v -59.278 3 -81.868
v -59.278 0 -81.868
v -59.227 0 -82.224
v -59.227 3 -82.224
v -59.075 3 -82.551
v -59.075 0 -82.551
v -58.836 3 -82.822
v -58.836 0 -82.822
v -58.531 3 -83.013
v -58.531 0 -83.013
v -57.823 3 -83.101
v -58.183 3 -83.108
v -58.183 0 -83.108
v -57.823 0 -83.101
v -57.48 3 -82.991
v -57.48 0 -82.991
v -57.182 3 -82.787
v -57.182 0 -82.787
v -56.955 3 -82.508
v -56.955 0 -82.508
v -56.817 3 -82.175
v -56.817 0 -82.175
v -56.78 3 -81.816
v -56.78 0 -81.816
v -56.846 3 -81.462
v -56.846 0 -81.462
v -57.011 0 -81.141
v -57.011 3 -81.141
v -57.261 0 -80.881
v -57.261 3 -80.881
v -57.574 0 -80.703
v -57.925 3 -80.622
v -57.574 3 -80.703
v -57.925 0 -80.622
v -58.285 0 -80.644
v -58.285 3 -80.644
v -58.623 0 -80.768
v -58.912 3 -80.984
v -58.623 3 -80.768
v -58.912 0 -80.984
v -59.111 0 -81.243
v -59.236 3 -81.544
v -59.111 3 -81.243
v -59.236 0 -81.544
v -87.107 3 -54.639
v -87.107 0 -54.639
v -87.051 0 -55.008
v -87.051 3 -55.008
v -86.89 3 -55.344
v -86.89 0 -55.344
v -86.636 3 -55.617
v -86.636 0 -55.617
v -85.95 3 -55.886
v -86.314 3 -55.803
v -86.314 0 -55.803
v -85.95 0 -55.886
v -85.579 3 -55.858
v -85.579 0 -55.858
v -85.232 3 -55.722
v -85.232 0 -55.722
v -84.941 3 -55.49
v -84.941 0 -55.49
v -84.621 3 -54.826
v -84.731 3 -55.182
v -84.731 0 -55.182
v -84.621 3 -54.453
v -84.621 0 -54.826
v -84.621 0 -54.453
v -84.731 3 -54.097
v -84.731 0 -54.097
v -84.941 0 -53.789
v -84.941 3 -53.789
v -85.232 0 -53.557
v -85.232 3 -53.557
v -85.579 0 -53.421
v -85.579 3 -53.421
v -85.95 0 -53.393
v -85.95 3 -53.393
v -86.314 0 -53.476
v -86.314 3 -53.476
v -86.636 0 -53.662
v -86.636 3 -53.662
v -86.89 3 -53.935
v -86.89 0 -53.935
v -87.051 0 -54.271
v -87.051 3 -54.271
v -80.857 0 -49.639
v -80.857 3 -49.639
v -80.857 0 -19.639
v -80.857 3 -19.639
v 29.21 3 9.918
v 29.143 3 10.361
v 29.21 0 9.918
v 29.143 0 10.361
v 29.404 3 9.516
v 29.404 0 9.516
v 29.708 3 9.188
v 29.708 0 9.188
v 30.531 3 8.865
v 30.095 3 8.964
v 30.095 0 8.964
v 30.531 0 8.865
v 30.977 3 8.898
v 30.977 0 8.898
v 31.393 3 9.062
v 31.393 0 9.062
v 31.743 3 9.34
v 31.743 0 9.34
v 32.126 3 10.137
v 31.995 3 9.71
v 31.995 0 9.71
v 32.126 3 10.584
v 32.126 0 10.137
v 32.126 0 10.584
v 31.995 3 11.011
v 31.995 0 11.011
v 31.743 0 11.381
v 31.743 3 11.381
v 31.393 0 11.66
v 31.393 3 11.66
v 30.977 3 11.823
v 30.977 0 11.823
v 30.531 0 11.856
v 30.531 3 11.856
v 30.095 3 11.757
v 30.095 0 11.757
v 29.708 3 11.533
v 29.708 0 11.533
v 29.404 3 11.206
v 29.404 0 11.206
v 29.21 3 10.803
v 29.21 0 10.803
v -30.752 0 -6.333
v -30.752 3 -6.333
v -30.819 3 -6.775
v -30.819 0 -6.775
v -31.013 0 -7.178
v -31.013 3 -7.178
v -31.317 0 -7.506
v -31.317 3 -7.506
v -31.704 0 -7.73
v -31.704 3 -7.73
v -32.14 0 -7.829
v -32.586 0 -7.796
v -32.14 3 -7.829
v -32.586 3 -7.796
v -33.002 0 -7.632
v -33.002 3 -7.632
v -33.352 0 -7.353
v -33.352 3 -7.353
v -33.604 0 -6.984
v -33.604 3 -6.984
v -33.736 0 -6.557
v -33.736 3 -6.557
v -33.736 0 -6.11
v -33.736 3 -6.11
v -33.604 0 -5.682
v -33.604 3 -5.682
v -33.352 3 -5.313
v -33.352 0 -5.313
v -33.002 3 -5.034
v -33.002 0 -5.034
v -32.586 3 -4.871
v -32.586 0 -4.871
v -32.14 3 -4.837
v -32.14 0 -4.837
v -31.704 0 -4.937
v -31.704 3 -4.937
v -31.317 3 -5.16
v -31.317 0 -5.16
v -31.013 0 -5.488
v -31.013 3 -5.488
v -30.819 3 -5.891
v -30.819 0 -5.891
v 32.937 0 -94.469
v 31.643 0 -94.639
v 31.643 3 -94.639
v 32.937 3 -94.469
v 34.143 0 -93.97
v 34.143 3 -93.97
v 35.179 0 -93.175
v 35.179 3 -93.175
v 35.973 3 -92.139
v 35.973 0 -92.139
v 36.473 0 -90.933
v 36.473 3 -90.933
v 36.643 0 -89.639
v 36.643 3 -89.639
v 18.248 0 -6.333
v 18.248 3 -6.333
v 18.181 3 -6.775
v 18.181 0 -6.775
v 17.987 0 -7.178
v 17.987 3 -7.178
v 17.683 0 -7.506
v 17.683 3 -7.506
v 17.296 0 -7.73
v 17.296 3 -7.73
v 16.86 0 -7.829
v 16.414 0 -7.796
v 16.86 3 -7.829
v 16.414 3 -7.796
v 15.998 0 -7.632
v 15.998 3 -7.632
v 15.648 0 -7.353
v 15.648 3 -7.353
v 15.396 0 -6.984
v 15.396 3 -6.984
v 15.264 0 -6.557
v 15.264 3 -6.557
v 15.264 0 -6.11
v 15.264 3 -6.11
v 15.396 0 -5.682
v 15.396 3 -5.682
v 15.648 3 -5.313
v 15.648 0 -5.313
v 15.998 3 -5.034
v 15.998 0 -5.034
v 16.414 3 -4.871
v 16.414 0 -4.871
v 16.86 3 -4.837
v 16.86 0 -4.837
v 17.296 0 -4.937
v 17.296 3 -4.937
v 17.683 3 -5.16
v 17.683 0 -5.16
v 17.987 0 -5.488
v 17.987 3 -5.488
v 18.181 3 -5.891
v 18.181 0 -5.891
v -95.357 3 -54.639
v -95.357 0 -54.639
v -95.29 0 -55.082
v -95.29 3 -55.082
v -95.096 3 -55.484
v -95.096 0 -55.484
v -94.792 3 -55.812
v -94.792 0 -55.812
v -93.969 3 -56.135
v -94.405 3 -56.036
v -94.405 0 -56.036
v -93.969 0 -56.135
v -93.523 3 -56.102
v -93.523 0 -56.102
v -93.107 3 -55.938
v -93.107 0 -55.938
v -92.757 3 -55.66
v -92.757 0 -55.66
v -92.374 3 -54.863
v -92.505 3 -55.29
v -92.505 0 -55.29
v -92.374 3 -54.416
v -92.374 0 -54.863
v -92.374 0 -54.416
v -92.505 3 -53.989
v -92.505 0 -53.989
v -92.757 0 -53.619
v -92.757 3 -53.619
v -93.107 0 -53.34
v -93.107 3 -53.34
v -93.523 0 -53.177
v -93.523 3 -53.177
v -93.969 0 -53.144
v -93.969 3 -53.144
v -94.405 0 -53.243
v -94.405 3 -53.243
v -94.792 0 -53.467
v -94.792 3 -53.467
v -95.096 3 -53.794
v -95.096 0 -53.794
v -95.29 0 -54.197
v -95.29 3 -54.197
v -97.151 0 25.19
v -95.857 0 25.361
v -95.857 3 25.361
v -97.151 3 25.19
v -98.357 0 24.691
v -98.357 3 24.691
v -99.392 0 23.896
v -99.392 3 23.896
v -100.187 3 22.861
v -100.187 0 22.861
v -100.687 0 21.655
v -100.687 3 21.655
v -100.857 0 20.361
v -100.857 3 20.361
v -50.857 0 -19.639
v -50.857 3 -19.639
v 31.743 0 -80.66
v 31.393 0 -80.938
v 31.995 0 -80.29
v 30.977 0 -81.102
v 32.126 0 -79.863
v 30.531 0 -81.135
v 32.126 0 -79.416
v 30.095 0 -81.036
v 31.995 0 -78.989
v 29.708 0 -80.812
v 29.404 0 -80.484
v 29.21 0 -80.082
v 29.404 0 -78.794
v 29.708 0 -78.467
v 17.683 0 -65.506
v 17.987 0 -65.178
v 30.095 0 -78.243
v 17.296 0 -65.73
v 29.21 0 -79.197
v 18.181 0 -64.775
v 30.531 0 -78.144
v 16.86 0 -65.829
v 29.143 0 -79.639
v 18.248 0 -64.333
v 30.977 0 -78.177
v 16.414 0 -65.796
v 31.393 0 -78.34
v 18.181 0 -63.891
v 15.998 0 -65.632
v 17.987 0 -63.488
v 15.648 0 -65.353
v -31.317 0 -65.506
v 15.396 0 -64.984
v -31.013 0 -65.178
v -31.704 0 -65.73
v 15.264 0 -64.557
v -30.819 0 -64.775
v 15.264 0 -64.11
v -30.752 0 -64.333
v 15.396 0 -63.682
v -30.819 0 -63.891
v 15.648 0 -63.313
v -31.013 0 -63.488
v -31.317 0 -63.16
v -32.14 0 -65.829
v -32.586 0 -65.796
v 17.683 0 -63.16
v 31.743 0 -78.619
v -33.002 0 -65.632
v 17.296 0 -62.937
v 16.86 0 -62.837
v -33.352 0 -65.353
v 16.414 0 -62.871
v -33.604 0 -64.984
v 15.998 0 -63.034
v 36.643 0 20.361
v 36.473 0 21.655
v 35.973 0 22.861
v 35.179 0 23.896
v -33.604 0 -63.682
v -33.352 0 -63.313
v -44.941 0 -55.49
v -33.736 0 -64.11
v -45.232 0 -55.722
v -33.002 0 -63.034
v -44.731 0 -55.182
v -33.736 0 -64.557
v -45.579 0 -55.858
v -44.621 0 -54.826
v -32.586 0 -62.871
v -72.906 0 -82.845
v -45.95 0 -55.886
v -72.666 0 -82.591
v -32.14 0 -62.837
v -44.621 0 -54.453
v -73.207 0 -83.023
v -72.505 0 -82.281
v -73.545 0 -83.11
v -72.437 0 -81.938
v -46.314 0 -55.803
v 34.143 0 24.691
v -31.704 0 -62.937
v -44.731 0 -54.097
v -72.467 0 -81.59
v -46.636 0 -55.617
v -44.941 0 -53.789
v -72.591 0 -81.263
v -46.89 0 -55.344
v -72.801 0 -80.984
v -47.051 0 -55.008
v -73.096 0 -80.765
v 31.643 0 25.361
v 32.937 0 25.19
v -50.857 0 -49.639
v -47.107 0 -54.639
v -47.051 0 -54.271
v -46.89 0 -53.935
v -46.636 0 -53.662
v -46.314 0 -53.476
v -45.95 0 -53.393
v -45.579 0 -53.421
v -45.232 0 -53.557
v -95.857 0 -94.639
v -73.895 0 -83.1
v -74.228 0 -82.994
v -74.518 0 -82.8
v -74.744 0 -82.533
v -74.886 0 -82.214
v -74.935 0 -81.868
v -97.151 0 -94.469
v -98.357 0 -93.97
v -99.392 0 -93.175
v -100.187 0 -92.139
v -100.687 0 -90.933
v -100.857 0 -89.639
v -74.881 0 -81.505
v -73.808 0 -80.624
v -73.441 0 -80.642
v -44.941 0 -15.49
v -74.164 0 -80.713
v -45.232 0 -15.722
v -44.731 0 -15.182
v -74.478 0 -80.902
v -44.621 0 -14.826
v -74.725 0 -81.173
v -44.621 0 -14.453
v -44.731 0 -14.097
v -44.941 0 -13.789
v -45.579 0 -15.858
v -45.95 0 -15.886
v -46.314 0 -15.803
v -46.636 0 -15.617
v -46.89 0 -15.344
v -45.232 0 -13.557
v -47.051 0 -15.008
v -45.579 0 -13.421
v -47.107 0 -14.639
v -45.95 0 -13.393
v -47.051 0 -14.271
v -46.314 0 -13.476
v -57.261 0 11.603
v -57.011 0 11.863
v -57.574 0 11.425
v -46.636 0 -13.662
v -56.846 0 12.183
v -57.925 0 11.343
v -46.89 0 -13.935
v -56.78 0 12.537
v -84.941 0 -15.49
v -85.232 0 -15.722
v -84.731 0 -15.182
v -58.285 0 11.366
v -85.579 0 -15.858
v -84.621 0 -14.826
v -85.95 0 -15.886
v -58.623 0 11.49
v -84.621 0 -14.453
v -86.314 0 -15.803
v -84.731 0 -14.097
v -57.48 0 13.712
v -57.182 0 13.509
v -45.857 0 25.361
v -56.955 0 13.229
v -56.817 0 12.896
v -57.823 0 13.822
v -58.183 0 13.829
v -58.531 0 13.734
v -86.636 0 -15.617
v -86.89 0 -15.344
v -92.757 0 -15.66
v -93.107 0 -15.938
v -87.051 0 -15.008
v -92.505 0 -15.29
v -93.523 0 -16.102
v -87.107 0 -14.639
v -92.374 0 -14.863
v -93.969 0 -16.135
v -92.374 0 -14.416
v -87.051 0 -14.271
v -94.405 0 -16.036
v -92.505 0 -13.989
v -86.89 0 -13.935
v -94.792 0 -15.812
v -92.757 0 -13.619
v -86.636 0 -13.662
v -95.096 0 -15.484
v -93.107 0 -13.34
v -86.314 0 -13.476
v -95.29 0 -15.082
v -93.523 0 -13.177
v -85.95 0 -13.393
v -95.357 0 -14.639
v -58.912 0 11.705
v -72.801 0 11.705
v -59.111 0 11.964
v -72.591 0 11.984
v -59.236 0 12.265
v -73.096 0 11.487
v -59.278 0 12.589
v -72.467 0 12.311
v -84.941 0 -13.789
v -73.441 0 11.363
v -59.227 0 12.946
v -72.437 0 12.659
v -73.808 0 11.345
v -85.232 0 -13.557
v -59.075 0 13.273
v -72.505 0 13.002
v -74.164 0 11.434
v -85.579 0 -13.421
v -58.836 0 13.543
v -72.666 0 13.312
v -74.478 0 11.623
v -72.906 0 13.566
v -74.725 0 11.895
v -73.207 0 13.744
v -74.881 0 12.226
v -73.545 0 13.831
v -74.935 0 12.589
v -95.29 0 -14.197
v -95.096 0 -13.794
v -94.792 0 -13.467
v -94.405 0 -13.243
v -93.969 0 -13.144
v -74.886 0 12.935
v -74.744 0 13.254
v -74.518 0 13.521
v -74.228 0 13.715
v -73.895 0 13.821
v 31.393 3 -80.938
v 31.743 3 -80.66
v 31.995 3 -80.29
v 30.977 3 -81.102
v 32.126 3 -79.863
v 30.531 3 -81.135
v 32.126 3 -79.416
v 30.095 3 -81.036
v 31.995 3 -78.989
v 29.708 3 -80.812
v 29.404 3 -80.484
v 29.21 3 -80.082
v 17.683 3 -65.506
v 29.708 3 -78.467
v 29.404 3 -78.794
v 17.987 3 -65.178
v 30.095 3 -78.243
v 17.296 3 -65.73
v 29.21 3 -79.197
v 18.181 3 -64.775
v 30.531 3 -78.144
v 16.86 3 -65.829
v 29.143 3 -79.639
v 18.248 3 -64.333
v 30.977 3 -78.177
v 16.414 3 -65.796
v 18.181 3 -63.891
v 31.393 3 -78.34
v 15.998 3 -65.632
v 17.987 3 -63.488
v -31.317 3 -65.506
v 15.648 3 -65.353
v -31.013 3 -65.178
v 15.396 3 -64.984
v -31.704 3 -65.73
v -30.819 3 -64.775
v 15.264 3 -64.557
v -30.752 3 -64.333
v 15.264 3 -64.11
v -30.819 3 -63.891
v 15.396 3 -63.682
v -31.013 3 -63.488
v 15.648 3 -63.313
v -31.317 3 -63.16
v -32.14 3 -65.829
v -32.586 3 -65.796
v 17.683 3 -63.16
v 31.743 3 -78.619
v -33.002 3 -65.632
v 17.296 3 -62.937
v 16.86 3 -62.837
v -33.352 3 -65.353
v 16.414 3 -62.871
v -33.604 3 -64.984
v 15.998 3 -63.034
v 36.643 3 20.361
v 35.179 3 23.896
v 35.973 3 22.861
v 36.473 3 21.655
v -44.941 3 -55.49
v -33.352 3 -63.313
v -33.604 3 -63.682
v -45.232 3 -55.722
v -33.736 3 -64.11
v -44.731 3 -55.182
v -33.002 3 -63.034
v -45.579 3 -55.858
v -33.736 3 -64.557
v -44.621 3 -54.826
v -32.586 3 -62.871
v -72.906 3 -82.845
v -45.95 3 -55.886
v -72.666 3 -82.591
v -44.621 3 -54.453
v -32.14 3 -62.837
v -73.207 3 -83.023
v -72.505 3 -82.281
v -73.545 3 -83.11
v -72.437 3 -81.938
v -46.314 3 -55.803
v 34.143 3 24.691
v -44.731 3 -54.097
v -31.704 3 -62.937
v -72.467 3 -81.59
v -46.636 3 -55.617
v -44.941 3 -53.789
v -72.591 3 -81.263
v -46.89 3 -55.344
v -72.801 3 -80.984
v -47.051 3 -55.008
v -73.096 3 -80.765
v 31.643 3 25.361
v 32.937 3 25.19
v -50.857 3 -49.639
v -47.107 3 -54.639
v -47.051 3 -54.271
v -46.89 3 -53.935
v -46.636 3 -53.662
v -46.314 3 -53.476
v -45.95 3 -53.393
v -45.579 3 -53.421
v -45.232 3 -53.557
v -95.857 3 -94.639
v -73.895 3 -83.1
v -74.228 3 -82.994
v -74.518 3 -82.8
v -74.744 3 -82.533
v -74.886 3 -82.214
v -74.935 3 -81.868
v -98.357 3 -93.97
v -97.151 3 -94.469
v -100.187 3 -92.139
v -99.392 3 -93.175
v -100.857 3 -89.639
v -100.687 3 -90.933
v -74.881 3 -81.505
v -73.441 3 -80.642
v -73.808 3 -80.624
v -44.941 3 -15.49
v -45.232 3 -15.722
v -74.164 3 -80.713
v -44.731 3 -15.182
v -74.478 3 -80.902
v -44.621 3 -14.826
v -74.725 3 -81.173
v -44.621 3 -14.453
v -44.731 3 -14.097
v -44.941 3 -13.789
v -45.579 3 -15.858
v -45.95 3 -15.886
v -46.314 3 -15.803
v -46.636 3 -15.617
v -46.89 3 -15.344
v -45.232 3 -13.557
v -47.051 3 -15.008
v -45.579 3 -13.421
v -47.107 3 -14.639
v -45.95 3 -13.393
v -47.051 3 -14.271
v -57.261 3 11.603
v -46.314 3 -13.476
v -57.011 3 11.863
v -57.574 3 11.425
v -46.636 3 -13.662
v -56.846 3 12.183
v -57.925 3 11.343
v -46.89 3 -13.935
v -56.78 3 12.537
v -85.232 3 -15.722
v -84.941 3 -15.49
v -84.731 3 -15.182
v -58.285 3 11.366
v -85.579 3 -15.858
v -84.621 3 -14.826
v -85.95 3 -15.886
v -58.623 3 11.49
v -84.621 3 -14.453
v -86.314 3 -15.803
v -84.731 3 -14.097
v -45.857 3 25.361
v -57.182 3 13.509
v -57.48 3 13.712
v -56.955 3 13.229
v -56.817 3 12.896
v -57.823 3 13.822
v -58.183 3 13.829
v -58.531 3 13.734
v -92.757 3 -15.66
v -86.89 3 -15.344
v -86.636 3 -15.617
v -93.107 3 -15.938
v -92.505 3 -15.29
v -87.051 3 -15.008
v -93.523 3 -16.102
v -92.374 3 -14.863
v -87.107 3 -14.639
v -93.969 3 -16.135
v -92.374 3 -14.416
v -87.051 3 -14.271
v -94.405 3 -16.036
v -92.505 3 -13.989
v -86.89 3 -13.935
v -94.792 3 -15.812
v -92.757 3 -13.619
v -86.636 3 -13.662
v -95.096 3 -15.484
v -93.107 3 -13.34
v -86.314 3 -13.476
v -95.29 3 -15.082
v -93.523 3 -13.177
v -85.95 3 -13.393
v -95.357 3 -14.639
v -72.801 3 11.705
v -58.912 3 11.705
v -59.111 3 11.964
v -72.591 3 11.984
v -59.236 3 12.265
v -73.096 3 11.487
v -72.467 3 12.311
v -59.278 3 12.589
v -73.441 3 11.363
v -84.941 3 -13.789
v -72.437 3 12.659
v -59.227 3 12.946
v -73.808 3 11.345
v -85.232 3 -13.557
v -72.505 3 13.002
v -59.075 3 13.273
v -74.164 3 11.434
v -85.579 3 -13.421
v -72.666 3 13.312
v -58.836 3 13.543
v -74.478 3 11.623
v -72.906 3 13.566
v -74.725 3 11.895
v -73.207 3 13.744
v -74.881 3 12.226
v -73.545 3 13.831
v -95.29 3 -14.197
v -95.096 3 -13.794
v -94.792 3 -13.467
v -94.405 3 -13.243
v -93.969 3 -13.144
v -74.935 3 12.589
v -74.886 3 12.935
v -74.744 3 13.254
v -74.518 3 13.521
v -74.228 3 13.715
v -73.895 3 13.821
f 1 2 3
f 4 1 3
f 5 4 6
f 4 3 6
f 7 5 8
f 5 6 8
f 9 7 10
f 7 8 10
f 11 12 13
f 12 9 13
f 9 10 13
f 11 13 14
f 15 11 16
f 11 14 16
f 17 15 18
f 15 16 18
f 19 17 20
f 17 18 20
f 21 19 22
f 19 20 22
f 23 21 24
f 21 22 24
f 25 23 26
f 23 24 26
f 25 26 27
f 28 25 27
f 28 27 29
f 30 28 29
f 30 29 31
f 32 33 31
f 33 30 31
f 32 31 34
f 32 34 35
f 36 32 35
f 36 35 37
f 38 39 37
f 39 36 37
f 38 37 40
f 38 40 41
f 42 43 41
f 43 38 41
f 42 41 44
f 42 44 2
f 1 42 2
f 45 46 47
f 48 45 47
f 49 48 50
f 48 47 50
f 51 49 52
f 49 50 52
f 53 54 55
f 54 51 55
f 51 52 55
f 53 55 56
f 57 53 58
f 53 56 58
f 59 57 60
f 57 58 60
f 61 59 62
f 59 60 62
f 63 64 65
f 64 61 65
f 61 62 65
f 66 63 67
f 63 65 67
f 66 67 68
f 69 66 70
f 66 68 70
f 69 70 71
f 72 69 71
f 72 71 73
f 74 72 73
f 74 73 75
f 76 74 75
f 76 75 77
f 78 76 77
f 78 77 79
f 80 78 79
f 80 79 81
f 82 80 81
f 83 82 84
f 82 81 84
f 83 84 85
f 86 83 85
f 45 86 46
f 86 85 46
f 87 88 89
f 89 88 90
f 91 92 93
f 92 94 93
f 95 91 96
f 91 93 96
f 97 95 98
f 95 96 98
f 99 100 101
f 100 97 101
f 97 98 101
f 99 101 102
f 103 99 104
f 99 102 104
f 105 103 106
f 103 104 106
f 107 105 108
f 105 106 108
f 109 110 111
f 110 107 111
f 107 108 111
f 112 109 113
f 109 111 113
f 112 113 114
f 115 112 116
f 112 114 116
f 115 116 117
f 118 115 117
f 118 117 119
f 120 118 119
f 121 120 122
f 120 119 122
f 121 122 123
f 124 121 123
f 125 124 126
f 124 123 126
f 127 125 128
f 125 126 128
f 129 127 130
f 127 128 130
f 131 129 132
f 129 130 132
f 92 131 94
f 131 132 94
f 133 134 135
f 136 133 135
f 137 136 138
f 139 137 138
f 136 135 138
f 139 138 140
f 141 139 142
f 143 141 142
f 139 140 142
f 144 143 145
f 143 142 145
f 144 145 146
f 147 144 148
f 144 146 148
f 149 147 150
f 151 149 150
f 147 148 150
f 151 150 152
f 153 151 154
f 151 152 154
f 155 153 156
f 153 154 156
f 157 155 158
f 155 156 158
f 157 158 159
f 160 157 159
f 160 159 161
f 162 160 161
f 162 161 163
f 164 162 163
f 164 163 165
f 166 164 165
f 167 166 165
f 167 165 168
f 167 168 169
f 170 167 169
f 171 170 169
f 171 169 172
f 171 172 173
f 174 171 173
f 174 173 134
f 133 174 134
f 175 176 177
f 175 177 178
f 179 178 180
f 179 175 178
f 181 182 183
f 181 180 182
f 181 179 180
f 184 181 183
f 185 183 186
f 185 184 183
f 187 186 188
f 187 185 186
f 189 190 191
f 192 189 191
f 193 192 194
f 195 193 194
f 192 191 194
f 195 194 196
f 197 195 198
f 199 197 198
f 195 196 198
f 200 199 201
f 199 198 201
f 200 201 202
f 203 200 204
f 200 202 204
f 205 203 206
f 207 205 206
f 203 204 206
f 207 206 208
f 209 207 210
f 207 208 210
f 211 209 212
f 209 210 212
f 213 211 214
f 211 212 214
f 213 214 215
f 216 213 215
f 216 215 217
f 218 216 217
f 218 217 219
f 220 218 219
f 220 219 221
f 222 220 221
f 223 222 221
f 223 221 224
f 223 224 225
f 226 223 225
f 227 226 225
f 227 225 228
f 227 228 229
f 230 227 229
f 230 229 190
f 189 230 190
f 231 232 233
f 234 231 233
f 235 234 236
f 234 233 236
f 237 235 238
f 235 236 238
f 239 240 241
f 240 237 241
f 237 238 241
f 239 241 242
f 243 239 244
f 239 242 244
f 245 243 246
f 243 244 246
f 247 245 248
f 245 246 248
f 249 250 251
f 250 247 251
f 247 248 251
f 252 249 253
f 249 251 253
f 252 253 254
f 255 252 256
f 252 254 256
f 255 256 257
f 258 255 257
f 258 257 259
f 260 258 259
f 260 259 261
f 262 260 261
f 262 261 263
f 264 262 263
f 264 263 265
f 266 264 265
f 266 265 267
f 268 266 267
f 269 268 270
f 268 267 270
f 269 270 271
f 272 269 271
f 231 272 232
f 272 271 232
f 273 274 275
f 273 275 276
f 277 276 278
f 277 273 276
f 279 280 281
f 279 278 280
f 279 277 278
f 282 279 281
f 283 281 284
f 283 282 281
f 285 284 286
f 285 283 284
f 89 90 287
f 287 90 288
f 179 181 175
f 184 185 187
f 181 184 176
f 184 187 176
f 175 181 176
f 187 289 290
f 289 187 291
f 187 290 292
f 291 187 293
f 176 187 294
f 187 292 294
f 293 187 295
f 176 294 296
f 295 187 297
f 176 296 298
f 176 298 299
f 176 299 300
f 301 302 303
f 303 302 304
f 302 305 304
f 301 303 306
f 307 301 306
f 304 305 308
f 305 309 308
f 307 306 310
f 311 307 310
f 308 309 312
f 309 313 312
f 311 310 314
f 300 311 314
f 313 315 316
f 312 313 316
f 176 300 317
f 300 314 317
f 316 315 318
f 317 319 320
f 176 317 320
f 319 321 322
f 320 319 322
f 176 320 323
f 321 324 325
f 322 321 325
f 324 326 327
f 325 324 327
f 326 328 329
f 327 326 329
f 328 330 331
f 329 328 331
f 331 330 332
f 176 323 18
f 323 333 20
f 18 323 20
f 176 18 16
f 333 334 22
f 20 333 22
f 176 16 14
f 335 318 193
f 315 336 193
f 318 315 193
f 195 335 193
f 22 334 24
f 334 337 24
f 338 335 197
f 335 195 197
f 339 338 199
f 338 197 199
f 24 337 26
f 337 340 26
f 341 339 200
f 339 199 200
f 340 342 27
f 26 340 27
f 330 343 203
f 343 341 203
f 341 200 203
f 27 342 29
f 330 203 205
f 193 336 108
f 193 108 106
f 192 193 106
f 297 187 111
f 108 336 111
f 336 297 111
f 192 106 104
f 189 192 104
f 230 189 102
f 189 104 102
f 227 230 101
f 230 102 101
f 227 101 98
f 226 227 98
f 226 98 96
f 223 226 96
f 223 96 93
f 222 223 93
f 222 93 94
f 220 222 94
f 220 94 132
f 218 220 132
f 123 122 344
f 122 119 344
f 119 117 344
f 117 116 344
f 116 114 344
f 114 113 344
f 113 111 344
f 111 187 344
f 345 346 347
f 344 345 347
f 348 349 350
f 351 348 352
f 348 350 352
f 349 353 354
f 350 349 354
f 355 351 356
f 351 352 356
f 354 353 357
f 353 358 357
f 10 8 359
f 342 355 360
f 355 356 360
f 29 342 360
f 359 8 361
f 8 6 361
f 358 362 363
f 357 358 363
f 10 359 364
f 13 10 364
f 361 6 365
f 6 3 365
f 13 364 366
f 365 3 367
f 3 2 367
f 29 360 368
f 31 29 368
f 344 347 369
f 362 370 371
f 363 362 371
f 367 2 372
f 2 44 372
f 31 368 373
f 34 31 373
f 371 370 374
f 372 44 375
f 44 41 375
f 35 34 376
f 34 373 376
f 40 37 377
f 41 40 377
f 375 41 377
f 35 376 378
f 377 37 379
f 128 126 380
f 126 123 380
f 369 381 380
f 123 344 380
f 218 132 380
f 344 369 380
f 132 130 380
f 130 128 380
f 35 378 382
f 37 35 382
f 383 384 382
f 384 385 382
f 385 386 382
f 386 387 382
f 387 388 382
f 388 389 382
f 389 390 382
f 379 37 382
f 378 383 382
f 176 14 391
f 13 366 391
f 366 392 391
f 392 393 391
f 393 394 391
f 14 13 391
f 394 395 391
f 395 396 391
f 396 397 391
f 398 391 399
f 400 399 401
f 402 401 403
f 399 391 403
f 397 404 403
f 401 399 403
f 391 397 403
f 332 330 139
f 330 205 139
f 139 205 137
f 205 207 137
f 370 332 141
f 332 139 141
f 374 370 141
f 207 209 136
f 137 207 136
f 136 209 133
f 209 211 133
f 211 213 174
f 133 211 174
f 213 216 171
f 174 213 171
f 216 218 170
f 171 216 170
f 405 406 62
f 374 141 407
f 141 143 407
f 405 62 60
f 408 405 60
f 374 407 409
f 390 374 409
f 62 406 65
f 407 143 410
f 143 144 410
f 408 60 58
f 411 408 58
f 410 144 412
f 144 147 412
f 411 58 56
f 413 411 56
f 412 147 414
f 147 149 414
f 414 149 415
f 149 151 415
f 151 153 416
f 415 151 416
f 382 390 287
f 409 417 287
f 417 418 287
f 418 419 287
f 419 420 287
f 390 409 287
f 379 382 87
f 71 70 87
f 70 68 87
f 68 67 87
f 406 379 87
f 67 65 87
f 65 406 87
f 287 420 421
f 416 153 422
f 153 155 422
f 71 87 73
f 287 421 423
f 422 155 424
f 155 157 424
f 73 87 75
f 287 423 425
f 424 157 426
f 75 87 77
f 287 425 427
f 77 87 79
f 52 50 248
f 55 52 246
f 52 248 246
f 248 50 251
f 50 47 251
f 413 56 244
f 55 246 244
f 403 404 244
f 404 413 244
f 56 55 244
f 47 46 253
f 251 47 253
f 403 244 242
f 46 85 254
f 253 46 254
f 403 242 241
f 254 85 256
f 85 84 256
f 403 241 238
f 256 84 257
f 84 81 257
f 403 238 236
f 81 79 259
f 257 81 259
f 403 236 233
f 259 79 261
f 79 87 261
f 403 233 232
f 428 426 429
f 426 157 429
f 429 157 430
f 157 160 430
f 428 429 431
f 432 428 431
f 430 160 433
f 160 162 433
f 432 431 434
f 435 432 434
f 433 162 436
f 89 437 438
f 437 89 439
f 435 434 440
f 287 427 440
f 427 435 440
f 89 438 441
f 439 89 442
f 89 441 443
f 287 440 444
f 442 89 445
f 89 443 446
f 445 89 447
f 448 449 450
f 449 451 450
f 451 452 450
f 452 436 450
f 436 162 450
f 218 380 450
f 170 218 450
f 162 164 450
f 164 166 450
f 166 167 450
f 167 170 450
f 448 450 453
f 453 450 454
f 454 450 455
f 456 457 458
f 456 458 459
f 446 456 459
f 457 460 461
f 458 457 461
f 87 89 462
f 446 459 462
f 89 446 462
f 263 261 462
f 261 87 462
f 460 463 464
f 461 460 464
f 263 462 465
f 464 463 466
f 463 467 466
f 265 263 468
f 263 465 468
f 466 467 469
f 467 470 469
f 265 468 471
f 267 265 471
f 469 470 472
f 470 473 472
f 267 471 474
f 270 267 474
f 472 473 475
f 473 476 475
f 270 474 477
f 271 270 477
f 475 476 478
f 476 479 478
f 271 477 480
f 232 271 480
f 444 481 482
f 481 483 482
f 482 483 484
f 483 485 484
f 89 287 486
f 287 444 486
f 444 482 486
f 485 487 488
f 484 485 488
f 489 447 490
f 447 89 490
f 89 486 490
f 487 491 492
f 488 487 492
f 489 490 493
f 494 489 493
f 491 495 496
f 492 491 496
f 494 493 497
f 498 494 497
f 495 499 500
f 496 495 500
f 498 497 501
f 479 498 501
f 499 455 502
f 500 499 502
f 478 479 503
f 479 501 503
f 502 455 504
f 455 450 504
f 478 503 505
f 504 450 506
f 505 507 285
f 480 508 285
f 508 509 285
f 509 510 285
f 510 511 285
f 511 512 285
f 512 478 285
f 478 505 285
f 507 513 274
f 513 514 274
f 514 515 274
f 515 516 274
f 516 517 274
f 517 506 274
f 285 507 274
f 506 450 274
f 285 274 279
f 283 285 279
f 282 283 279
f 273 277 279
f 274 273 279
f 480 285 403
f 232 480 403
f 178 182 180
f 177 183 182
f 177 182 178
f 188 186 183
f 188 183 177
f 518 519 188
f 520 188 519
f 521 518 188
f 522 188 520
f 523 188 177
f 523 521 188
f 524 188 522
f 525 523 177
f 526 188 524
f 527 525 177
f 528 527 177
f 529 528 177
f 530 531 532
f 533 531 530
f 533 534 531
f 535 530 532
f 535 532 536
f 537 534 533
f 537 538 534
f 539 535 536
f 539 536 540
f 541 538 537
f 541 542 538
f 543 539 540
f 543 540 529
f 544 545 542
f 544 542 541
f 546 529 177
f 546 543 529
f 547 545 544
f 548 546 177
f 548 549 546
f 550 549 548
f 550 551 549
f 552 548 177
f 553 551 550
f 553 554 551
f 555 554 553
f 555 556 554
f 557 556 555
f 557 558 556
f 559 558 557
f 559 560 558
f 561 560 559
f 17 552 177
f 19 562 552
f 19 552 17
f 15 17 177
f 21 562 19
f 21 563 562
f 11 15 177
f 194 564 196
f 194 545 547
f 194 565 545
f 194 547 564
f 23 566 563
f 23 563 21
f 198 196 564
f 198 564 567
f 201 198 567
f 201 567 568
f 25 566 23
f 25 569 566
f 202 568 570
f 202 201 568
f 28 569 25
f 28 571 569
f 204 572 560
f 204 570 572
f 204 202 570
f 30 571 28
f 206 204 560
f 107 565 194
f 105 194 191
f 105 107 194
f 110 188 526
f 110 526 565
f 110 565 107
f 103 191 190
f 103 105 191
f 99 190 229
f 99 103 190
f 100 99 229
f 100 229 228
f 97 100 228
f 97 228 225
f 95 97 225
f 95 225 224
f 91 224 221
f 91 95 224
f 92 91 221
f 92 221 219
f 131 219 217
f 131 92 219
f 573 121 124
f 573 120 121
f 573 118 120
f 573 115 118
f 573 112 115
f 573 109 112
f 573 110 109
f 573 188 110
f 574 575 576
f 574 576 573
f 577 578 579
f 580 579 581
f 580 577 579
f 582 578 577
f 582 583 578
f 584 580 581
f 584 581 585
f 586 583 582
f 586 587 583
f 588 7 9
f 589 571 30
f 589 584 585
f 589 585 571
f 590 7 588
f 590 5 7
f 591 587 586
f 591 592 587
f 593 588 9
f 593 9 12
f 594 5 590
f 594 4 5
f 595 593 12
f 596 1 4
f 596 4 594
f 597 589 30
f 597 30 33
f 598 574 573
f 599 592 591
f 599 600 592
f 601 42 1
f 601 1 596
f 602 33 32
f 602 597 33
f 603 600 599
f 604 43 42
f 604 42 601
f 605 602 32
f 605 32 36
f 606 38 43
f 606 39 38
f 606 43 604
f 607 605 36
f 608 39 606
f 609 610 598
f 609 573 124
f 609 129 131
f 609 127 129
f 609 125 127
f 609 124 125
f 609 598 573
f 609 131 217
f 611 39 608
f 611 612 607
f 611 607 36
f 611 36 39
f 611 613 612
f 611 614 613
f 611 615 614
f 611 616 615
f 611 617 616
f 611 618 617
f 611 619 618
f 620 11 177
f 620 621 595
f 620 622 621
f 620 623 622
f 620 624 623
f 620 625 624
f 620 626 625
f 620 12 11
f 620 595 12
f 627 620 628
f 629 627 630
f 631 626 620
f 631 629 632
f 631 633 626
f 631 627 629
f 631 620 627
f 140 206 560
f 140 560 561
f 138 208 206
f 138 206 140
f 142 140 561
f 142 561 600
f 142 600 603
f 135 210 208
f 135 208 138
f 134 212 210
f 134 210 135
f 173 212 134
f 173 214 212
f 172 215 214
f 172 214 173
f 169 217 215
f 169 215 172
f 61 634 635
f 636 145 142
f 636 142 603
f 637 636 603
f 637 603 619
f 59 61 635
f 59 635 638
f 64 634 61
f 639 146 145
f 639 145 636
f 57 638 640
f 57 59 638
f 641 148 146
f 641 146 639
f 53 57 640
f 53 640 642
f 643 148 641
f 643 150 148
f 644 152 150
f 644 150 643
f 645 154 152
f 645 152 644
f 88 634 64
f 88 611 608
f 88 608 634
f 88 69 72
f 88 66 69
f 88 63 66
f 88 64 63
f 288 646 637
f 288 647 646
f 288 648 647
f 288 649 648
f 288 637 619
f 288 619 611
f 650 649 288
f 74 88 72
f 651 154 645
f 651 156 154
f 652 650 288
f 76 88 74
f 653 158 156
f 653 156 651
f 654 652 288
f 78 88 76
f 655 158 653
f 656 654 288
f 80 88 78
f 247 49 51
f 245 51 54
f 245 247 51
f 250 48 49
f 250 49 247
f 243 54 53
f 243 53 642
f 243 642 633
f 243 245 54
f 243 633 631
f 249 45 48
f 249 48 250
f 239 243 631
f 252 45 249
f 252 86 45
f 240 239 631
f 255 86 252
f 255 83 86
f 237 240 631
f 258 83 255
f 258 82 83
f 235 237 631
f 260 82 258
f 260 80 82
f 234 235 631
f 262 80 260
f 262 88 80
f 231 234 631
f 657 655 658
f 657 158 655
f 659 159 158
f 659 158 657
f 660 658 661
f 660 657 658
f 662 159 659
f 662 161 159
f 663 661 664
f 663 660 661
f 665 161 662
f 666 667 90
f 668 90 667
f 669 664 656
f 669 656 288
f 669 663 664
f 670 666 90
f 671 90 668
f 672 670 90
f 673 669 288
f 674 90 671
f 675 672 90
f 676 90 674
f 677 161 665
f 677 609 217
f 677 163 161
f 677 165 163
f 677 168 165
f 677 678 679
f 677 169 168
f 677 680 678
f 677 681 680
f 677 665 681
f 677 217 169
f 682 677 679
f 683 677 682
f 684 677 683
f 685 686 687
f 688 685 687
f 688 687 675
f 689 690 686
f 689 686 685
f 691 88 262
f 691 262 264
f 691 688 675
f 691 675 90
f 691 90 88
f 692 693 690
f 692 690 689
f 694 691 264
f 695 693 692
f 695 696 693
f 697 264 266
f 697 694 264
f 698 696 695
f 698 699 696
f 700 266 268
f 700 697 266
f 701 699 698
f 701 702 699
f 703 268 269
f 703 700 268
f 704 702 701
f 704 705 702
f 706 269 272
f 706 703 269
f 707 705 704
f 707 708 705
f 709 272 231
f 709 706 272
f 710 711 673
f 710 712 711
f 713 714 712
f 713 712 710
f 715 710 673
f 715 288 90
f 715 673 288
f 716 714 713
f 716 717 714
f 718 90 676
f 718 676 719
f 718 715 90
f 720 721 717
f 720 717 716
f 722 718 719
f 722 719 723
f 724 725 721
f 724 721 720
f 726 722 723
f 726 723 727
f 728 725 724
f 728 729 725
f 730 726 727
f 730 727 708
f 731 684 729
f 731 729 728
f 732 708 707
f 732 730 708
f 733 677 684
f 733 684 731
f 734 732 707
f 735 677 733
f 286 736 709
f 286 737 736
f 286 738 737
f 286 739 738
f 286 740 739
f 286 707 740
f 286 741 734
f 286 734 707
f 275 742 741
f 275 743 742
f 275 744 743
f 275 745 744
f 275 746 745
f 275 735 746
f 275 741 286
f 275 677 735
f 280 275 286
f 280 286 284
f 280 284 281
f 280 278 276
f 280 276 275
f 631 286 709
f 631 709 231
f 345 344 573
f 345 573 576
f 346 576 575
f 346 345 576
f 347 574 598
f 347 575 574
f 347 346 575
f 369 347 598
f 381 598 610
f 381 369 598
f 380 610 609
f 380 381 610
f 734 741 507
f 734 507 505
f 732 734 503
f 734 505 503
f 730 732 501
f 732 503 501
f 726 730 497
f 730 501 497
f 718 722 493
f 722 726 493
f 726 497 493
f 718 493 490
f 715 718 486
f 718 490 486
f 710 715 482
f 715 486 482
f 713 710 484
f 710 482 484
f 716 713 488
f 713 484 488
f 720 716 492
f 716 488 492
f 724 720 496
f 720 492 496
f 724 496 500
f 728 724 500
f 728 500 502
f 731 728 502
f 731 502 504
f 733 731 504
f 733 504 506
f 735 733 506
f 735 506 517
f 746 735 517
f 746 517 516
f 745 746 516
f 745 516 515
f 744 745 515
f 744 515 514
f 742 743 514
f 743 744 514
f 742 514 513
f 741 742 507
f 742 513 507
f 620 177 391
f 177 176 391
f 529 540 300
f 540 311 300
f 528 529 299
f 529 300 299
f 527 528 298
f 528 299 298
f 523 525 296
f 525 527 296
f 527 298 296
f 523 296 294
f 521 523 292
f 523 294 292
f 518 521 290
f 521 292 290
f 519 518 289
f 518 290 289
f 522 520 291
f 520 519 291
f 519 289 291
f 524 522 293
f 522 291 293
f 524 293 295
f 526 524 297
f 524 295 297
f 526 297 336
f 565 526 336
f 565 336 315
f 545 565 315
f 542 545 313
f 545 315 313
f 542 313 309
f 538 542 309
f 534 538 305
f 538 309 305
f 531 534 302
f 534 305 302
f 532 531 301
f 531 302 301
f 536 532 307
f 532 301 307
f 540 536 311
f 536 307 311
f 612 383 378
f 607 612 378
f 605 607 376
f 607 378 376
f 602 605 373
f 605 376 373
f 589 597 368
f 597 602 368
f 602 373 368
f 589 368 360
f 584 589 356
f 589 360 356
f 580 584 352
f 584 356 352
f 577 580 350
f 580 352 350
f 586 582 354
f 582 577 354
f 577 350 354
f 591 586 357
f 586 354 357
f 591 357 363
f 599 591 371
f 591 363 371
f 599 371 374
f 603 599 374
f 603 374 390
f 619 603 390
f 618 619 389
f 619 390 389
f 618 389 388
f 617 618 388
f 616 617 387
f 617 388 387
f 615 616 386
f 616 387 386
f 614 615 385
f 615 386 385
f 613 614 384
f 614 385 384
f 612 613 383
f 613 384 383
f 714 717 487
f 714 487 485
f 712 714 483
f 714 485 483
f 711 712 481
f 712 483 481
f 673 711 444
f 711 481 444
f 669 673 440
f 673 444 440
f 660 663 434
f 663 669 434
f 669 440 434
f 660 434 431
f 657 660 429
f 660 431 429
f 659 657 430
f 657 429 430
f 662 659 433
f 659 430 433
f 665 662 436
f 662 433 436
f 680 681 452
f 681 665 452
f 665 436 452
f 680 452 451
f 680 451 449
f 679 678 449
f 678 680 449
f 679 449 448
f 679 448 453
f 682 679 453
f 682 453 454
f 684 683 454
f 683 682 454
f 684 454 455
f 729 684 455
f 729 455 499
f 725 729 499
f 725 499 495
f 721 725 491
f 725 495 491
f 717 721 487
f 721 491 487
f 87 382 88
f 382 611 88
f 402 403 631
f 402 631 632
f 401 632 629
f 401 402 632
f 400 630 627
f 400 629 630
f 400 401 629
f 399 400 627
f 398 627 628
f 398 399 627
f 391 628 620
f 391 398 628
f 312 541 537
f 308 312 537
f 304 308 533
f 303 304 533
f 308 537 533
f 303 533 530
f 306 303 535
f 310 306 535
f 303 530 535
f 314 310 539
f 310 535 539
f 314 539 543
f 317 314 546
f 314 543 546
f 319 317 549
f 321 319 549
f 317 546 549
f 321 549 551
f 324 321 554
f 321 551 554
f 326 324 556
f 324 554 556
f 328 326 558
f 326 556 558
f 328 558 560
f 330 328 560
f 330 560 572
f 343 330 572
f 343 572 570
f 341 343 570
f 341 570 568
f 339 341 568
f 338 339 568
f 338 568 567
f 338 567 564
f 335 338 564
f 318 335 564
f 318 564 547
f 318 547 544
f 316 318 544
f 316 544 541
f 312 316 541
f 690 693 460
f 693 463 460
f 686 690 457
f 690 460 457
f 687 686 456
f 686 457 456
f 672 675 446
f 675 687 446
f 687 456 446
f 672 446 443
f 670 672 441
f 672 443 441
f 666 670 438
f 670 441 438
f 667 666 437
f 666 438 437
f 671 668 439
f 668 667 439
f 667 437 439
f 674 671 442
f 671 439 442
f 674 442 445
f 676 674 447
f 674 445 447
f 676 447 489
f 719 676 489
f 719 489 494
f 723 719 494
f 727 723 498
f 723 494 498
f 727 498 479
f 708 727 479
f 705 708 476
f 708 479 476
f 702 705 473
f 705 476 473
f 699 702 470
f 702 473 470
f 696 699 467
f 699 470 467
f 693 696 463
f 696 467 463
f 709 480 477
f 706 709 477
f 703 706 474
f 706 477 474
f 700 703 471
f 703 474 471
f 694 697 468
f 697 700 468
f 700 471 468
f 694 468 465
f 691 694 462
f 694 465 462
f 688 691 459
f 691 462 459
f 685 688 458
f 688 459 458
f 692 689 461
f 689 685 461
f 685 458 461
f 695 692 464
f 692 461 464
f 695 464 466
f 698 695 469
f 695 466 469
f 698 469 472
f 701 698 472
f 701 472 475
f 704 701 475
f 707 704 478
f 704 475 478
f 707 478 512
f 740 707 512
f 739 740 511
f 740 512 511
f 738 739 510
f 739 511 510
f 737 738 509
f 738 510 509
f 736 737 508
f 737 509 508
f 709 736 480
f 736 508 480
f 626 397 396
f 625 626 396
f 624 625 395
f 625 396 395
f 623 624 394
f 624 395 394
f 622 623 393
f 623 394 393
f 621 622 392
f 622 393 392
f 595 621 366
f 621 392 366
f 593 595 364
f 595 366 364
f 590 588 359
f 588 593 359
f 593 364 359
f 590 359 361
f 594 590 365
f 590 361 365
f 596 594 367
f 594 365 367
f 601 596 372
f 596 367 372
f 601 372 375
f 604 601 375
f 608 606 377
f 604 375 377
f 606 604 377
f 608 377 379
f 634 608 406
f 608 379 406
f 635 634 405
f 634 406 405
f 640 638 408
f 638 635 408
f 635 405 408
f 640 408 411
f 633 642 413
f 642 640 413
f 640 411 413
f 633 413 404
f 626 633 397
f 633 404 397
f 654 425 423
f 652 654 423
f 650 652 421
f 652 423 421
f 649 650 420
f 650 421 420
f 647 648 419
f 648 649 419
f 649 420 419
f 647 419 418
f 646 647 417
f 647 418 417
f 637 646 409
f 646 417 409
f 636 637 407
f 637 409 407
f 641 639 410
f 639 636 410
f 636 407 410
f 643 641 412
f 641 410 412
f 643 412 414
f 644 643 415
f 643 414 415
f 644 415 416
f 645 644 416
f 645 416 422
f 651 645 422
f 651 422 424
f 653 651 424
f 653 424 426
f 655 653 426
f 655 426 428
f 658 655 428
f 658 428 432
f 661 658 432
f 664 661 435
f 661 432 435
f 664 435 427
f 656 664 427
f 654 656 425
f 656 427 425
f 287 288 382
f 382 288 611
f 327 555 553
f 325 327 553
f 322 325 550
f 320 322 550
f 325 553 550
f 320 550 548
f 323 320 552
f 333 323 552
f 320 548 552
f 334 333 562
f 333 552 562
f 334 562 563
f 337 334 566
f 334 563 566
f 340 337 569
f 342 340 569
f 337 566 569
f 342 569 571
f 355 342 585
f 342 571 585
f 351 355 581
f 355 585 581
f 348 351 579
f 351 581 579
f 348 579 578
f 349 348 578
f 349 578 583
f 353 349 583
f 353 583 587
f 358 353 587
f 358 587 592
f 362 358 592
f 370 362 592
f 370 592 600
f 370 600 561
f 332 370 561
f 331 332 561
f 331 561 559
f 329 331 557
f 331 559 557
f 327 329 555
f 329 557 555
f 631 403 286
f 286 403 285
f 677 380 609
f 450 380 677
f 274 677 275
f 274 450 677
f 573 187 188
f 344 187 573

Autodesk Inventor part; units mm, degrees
ref_plane "YZ Plane" through (0, 0, 0) normal (1, 0, 0) x (0, 1, 0)
ref_plane "XZ Plane" through (0, 0, 0) normal (0, 1, 0) x (-1, 0, 0)
ref_plane "XY Plane" through (0, 0, 0) normal (0, 0, 1) x (1, 0, 0)
sketch "Sketch1" plane through (0, 0, 0) normal (0, 1, 0) x (-1, 0, 0)
  line L0 (-31.6431, 25.3606) -> (38.3569, 25.3606)
  line L1 (100.8569, -14.6394) -> (100.8569, -54.6394)
  line L2 (-31.6431, -94.6394) -> (38.3569, -94.6394)
  arc A0 (-36.6431, -89.6394) -> (-31.6431, -94.6394) centre (-31.6431, -89.6394) ccw
  line L3 (-36.6431, -89.6394) -> (-36.6431, 20.3606)
  arc A1 (-31.6431, 25.3606) -> (-36.6431, 20.3606) centre (-31.6431, 20.3606) ccw
  circle A2 centre (-30.6431, 10.3606) radius 1.5
  circle A3 centre (45.8569, -54.6394) radius 1.25
  circle A4 centre (45.8569, -14.6394) radius 1.25
  circle A5 centre (85.8569, -14.6394) radius 1.25
  circle A6 centre (93.8569, -14.6394) radius 1.5
  circle A7 centre (93.8569, -54.6394) radius 1.5
  circle A8 centre (85.8569, -54.6394) radius 1.25
  circle A9 centre (-30.6431, -79.6394) radius 1.5
  line L4 (38.3569, -94.6394) -> (95.8569, -94.6394)
  line L5 (100.8569, -89.6394) -> (100.8569, 20.3606)
  line L6 (95.8569, 25.3606) -> (38.3569, 25.3606)
  arc A10 (95.8569, -94.6394) -> (100.8569, -89.6394) centre (95.8569, -89.6394) ccw
  arc A11 (100.8569, 20.3606) -> (95.8569, 25.3606) centre (95.8569, 20.3606) ccw
  line L7 (45.8569, -89.6394) -> (60.8569, -89.6394)
  line L8 (60.8569, -89.6394) -> (60.8569, -79.0394)
  line L9 (60.8569, -79.0394) -> (45.8569, -79.0394)
  line L10 (45.8569, -79.0394) -> (45.8569, -89.6394)
  line L11 (85.8569, -89.6394) -> (70.8569, -89.6394)
  line L12 (70.8569, -89.6394) -> (70.8569, -79.0394)
  line L13 (70.8569, -79.0394) -> (85.8569, -79.0394)
  line L14 (85.8569, -79.0394) -> (85.8569, -89.6394)
  line L15 (45.8569, 25.3606) -> (45.8569, 20.3606)
  line L16 (45.8569, 20.3606) -> (60.8569, 20.3606)
  line L17 (60.8569, 20.3606) -> (60.8569, 9.7606)
  line L18 (60.8569, 9.7606) -> (45.8569, 9.7606)
  line L19 (45.8569, 9.7606) -> (45.8569, 20.3606)
  line L20 (85.8569, 20.3606) -> (70.8569, 20.3606)
  line L21 (70.8569, 20.3606) -> (70.8569, 9.7606)
  line L22 (70.8569, 9.7606) -> (85.8569, 9.7606)
  line L23 (85.8569, 9.7606) -> (85.8569, 20.3606)
  line L24 (60.8569, -79.0394) -> (58.0285, -81.8678)
  line L25 (60.8569, -79.0394) -> (64.8569, -79.0394) construction
  line L26 (70.8569, -79.0394) -> (73.6853, -81.8678)
  line L27 (60.8569, 9.7606) -> (58.0285, 12.589)
  line L28 (60.8569, 9.7606) -> (64.8569, 9.7606) construction
  line L29 (70.8569, 9.7606) -> (73.6853, 12.589)
  line L30 (70.8569, 9.7606) -> (74.8569, 9.7606) construction
  circle A12 centre (58.0285, 12.589) radius 1.25
  circle A13 centre (73.6853, 12.589) radius 1.25
  circle A14 centre (73.6853, -81.8678) radius 1.25
  circle A15 centre (58.0285, -81.8678) radius 1.25
  point P0 (0, 0)
  point P1 (-36.6431, -94.6394)
  point P2 (-36.6431, -94.6394)
  point P3 (-36.6431, -94.6394)
  point P4 (100.8569, 25.3606)
  dimension "d8" = 5
  dimension "d9" = 15
  dimension "d10" = 10.6
  dimension "d11" = 15
  dimension "d12" = 10.6
  dimension "d13" = 5
  dimension "d14" = 5
  dimension "d15" = 15
  dimension "d16" = 10.6
  dimension "d17" = 15
  dimension "d18" = 10.6
  dimension "d19" = 4
  dimension "d20" = 135
  dimension "d21" = 4
  dimension "d22" = 4
  dimension "d23" = 135
  dimension "d24" = 4
  dimension "d25" = 45
  dimension "d26" = 2.5
  dimension "d27" = 2.5
  dimension "d28" = 2.5
  dimension "d29" = 2.5
ref_plane "Work Plane1" through (0, 3, 0) normal (0, 1, 0) x (1, 0, 0)
sketch "Sketch2" plane through (0, 3, 0) normal (0, 1, 0) x (1, 0, 0)
  circle A0 centre (16.7477, 6.3332) radius 1.25 projected
  circle A1 centre (-32.2523, 6.3332) radius 1.25 projected
  circle A2 centre (-32.2523, 64.3332) radius 1.25 projected
  circle A3 centre (16.7477, 64.3332) radius 1.25 projected
  circle A4 centre (16.7477, 64.3332) radius 1.5
  circle A5 centre (-32.2523, 64.3332) radius 1.5
  circle A6 centre (-32.2523, 6.3332) radius 1.5
  circle A7 centre (16.7477, 6.3332) radius 1.5
  point P0 (0, 0)
  dimension "d2" = 3
  dimension "d3" = 3
  dimension "d4" = 3
  dimension "d5" = 3
extrude "Extrusion3" add sketch "Sketch1" along normal blind 3 contours L16 L17 L18 L19 | L0 L6 A11 L5 L1 A10 L4 L2 A0 L3 A1 | L10 L9 L8 L7 | L11 L12 L13 L14 | L23 L22 L21 L20
extrude "Extrusion4" cut sketch "Sketch2" against normal blind 3 contours A0 | A1 | A2 | A3 | A4 | A5 | A6 | A7
sketch "Sketch3" plane through (0, 3, 0) normal (0, 1, 0) x (1, 0, 0)
  circle A0 centre (-85.8569, 14.6394) radius 1.25 construction
  circle A1 centre (-45.8569, 54.6394) radius 1.25 construction
  line L0 (-85.8569, 14.6394) -> (-45.8569, 54.6394) construction
  circle A2 centre (-85.8569, 54.6394) radius 1.25 construction
  line L1 (-85.8569, 54.6394) -> (-45.8569, 14.6394) construction
  line L2 (-80.8569, 19.6394) -> (-50.8569, 19.6394)
  line L3 (-50.8569, 19.6394) -> (-50.8569, 49.6394)
  line L4 (-50.8569, 49.6394) -> (-80.8569, 49.6394)
  line L5 (-80.8569, 49.6394) -> (-80.8569, 19.6394)
  line L6 (-80.8569, 19.6394) -> (-50.8569, 49.6394) construction
  line L7 (-50.8569, 19.6394) -> (-80.8569, 49.6394) construction
  point P0 (0, 0)
  point P1 (-65.8569, 34.6394)
  dimension "d34" = 30
  dimension "d35" = 30
extrude "Extrusion5" cut sketch "Sketch3" against normal blind 10
properties part number "Top base 2"
